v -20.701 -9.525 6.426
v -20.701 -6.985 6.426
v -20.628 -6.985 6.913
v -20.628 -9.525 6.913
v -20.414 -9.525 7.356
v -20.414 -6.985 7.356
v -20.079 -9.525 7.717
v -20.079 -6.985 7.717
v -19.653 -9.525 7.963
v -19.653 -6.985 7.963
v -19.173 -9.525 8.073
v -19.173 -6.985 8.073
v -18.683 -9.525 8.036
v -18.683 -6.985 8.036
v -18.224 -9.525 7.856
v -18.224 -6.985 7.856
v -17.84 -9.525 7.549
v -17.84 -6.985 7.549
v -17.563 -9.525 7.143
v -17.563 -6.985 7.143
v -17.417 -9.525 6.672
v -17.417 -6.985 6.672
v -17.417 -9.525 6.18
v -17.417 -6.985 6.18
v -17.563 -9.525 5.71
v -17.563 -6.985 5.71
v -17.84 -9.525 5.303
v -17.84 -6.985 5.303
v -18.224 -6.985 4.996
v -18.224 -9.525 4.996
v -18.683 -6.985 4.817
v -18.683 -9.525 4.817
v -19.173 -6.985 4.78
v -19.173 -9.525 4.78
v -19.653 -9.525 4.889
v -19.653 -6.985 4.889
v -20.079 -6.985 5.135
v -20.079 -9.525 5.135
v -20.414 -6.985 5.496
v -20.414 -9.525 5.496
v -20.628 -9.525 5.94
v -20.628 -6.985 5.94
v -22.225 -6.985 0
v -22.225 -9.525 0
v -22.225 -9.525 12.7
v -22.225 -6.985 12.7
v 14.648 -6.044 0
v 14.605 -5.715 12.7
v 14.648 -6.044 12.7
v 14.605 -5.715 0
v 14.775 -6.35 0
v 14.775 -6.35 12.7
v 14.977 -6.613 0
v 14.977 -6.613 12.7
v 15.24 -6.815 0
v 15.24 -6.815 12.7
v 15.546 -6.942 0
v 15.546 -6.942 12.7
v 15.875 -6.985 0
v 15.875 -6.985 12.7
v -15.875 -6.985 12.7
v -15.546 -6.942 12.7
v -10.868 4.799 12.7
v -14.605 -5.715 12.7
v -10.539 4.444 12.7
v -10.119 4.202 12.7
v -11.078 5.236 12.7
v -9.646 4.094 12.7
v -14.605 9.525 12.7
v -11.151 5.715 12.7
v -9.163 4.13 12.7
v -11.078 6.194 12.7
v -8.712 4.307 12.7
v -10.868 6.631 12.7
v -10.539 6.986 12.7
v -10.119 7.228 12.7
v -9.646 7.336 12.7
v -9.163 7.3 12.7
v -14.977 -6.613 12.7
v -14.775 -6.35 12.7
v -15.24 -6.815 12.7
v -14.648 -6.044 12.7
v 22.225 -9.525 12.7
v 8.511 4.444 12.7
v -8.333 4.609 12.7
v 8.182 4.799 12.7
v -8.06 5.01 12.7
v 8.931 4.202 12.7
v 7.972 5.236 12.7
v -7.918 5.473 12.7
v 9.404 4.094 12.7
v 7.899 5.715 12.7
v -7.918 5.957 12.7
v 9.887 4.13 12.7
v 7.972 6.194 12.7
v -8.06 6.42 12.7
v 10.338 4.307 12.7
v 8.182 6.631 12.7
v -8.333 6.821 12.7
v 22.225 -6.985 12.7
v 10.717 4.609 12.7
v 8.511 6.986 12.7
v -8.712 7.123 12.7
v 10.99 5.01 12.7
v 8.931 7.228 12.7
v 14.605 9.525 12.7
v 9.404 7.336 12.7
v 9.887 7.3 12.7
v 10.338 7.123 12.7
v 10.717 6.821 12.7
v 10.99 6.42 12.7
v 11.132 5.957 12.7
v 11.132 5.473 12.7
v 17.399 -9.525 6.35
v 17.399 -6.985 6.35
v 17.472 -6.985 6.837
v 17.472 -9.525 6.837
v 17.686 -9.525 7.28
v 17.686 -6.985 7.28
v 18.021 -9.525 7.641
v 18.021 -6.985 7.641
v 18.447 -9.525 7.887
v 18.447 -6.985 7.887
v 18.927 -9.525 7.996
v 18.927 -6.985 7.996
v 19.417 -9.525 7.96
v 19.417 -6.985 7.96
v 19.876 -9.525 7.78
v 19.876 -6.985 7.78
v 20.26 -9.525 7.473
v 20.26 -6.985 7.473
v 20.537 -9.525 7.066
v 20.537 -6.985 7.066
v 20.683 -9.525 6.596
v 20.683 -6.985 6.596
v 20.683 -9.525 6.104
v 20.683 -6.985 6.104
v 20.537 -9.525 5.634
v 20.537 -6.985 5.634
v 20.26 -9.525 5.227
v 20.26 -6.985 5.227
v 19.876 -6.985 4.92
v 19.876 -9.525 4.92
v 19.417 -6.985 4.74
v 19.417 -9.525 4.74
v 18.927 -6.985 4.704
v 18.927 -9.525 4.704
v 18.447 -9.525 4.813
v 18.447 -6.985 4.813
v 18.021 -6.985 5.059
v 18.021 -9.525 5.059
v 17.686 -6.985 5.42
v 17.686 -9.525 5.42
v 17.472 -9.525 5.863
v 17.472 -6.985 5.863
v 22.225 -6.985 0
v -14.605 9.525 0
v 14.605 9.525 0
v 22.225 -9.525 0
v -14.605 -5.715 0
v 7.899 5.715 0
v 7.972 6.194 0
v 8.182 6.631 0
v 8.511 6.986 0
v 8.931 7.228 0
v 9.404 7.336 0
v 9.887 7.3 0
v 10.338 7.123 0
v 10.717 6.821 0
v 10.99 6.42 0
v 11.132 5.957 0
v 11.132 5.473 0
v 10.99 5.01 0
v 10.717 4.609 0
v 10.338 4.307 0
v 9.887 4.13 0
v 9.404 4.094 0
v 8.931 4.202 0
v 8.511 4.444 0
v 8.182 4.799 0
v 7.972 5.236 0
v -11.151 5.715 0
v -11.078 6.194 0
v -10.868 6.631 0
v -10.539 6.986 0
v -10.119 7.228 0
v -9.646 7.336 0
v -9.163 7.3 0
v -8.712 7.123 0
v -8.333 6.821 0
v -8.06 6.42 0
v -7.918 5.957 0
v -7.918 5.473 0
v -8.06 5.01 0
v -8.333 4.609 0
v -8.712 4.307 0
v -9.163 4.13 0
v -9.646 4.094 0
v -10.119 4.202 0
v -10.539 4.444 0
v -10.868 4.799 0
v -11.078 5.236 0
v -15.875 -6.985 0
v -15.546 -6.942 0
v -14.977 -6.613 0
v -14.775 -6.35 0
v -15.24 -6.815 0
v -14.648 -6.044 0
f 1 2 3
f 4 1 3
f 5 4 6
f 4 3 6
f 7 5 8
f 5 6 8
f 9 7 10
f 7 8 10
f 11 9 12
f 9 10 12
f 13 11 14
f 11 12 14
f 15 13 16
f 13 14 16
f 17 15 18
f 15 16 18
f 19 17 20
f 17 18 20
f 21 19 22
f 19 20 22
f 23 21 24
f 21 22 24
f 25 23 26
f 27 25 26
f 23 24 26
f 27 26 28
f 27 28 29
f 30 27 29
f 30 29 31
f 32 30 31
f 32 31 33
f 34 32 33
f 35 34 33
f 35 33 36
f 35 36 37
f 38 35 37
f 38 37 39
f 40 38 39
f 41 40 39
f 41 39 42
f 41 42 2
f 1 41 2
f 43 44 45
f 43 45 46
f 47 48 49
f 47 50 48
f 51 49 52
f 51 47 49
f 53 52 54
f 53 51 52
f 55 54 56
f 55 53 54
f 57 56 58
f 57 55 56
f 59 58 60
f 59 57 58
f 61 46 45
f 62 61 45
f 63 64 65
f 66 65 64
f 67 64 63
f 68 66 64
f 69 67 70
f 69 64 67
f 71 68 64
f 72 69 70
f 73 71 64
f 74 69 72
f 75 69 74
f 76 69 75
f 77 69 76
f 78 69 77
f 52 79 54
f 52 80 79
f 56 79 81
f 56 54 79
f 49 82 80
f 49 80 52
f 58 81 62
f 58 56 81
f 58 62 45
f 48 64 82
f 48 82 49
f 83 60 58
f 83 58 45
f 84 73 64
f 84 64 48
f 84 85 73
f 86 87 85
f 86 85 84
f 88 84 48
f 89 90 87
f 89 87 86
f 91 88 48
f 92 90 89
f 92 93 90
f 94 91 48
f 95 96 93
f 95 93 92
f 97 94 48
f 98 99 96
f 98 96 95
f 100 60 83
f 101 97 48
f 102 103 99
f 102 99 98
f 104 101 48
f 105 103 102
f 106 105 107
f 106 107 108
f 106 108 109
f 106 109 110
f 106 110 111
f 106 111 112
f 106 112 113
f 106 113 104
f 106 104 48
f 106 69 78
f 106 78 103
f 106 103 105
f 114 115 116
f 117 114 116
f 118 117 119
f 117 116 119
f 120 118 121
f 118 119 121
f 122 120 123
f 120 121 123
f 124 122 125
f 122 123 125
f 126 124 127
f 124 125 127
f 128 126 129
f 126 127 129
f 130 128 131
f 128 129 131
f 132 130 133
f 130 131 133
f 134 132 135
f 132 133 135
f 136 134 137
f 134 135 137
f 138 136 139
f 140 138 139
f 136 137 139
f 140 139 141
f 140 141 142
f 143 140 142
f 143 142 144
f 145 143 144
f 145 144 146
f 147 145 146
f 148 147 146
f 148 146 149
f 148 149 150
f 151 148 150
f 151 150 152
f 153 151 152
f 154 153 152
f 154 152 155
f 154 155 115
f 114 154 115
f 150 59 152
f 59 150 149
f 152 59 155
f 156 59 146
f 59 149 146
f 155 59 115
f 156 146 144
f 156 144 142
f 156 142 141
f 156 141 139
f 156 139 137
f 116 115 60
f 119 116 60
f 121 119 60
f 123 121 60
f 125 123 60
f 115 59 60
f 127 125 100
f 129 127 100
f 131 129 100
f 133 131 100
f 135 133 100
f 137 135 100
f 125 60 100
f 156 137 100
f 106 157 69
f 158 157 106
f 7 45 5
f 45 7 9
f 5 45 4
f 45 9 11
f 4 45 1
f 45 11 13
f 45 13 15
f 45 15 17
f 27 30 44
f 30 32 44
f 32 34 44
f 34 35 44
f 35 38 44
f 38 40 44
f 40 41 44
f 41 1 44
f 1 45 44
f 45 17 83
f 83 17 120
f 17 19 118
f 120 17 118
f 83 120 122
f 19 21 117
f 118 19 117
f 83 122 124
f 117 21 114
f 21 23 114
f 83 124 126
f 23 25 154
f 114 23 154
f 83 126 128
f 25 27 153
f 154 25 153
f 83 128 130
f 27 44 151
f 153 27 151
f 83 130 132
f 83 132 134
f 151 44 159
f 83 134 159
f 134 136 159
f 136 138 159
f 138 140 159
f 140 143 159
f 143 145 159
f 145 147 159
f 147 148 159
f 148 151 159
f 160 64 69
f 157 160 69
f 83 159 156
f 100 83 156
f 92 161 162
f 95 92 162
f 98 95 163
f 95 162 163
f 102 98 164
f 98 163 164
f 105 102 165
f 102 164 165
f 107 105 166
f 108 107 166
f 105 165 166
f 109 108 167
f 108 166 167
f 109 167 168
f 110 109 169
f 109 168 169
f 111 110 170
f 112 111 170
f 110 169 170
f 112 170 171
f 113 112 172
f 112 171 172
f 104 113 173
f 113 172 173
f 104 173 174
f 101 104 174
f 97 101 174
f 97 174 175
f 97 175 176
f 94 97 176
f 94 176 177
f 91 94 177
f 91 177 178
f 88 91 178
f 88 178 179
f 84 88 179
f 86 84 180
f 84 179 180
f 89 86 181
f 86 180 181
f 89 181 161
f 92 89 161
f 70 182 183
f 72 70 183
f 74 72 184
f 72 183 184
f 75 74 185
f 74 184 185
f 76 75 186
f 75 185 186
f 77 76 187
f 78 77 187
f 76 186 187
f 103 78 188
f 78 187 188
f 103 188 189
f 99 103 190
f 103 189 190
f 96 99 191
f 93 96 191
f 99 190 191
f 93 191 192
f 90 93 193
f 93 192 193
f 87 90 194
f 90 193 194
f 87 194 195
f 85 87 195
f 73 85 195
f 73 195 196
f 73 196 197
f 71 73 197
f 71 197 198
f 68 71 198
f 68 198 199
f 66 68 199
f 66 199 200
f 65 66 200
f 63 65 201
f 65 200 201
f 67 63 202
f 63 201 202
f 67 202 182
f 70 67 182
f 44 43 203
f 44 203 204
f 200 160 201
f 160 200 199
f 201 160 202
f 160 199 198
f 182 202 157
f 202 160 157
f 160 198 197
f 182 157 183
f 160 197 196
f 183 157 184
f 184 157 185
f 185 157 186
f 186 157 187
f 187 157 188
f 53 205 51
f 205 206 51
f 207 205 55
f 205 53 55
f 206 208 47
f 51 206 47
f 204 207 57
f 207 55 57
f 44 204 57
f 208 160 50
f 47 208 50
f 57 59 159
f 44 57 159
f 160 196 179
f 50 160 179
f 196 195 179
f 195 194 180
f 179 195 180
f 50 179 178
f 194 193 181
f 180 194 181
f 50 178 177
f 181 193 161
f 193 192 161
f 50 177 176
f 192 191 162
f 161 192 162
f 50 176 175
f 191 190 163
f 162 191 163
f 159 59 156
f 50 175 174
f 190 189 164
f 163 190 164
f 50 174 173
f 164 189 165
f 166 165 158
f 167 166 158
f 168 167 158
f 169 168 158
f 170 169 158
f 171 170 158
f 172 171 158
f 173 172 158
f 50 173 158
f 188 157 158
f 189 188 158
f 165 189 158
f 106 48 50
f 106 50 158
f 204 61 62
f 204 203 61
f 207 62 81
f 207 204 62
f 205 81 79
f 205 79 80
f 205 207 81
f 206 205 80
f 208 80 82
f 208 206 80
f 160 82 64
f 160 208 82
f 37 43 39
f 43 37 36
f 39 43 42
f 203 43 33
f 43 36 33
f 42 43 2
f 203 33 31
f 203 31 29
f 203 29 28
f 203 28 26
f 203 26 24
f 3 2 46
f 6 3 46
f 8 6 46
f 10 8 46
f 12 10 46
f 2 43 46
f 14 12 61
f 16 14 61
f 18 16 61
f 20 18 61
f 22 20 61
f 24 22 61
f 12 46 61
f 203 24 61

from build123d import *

# Parameters (mm, degrees)
SKETCH1_W           = 44.45
SKETCH1_H           = 19.05
BOSS_EXTRUDE1_DEPTH = 12.7
SKETCH2_W           = 7.62
SKETCH2_H           = 16.51
CUT_EXTRUDE1_DEPTH  = 12.7
FILLET1_R           = 1.27
FILLET2_R           = 1.27
SKETCH3_R           = 1.6256
CUT_EXTRUDE2_DEPTH  = 12.7
SKETCH4_R           = 1.651
CUT_EXTRUDE3_DEPTH  = 12.7


with BuildPart() as part:
    # Sketch1 → Boss-Extrude1 (new body)
    with BuildSketch(Plane.XY):
        Rectangle(SKETCH1_W, SKETCH1_H)
    extrude(amount=BOSS_EXTRUDE1_DEPTH)

    # Sketch2 → Cut-Extrude1 (cut)
    with BuildSketch(Plane.XY.offset(12.7)):
        with Locations((-18.415, 1.27)):
            Rectangle(SKETCH2_W, SKETCH2_H)
        with Locations((18.415, 1.27)):
            Rectangle(SKETCH2_W, SKETCH2_H)
    extrude(amount=-CUT_EXTRUDE1_DEPTH, mode=Mode.SUBTRACT)

    # Fillet1
    fillet1_edges = [part.edges().sort_by_distance(p)[0] for p in [
        (-14.605, -6.985, 6.35),
    ]]
    fillet(fillet1_edges, radius=FILLET1_R)

    # Fillet2
    fillet2_edges = [part.edges().sort_by_distance(p)[0] for p in [
        (14.605, -6.985, 6.35),
    ]]
    fillet(fillet2_edges, radius=FILLET2_R)

    # Sketch3 → Cut-Extrude2 (cut)
    with BuildSketch(Plane(origin=(0, 0, 0), x_dir=(-1, 0, 0), z_dir=(0, 0, -1))):
        with Locations((-9.525, 5.715)):
            Circle(SKETCH3_R)
        with Locations((9.525, 5.715)):
            Circle(SKETCH3_R)
    extrude(amount=-CUT_EXTRUDE2_DEPTH, mode=Mode.SUBTRACT)

    # Sketch4 → Cut-Extrude3 (cut)
    with BuildSketch(Plane(origin=(0, -6.985, 0), x_dir=(1, 0, 0), z_dir=(0, 1, 0))):
        with Locations(Location((19.05, -6.35, 0), (0, 0, 180))):
            Circle(SKETCH4_R)
        with Locations(Location((-19.05, -6.4262, 0), (0, 0, 180))):
            Circle(SKETCH4_R)
    extrude(amount=-CUT_EXTRUDE3_DEPTH, mode=Mode.SUBTRACT)


solid = part.part
